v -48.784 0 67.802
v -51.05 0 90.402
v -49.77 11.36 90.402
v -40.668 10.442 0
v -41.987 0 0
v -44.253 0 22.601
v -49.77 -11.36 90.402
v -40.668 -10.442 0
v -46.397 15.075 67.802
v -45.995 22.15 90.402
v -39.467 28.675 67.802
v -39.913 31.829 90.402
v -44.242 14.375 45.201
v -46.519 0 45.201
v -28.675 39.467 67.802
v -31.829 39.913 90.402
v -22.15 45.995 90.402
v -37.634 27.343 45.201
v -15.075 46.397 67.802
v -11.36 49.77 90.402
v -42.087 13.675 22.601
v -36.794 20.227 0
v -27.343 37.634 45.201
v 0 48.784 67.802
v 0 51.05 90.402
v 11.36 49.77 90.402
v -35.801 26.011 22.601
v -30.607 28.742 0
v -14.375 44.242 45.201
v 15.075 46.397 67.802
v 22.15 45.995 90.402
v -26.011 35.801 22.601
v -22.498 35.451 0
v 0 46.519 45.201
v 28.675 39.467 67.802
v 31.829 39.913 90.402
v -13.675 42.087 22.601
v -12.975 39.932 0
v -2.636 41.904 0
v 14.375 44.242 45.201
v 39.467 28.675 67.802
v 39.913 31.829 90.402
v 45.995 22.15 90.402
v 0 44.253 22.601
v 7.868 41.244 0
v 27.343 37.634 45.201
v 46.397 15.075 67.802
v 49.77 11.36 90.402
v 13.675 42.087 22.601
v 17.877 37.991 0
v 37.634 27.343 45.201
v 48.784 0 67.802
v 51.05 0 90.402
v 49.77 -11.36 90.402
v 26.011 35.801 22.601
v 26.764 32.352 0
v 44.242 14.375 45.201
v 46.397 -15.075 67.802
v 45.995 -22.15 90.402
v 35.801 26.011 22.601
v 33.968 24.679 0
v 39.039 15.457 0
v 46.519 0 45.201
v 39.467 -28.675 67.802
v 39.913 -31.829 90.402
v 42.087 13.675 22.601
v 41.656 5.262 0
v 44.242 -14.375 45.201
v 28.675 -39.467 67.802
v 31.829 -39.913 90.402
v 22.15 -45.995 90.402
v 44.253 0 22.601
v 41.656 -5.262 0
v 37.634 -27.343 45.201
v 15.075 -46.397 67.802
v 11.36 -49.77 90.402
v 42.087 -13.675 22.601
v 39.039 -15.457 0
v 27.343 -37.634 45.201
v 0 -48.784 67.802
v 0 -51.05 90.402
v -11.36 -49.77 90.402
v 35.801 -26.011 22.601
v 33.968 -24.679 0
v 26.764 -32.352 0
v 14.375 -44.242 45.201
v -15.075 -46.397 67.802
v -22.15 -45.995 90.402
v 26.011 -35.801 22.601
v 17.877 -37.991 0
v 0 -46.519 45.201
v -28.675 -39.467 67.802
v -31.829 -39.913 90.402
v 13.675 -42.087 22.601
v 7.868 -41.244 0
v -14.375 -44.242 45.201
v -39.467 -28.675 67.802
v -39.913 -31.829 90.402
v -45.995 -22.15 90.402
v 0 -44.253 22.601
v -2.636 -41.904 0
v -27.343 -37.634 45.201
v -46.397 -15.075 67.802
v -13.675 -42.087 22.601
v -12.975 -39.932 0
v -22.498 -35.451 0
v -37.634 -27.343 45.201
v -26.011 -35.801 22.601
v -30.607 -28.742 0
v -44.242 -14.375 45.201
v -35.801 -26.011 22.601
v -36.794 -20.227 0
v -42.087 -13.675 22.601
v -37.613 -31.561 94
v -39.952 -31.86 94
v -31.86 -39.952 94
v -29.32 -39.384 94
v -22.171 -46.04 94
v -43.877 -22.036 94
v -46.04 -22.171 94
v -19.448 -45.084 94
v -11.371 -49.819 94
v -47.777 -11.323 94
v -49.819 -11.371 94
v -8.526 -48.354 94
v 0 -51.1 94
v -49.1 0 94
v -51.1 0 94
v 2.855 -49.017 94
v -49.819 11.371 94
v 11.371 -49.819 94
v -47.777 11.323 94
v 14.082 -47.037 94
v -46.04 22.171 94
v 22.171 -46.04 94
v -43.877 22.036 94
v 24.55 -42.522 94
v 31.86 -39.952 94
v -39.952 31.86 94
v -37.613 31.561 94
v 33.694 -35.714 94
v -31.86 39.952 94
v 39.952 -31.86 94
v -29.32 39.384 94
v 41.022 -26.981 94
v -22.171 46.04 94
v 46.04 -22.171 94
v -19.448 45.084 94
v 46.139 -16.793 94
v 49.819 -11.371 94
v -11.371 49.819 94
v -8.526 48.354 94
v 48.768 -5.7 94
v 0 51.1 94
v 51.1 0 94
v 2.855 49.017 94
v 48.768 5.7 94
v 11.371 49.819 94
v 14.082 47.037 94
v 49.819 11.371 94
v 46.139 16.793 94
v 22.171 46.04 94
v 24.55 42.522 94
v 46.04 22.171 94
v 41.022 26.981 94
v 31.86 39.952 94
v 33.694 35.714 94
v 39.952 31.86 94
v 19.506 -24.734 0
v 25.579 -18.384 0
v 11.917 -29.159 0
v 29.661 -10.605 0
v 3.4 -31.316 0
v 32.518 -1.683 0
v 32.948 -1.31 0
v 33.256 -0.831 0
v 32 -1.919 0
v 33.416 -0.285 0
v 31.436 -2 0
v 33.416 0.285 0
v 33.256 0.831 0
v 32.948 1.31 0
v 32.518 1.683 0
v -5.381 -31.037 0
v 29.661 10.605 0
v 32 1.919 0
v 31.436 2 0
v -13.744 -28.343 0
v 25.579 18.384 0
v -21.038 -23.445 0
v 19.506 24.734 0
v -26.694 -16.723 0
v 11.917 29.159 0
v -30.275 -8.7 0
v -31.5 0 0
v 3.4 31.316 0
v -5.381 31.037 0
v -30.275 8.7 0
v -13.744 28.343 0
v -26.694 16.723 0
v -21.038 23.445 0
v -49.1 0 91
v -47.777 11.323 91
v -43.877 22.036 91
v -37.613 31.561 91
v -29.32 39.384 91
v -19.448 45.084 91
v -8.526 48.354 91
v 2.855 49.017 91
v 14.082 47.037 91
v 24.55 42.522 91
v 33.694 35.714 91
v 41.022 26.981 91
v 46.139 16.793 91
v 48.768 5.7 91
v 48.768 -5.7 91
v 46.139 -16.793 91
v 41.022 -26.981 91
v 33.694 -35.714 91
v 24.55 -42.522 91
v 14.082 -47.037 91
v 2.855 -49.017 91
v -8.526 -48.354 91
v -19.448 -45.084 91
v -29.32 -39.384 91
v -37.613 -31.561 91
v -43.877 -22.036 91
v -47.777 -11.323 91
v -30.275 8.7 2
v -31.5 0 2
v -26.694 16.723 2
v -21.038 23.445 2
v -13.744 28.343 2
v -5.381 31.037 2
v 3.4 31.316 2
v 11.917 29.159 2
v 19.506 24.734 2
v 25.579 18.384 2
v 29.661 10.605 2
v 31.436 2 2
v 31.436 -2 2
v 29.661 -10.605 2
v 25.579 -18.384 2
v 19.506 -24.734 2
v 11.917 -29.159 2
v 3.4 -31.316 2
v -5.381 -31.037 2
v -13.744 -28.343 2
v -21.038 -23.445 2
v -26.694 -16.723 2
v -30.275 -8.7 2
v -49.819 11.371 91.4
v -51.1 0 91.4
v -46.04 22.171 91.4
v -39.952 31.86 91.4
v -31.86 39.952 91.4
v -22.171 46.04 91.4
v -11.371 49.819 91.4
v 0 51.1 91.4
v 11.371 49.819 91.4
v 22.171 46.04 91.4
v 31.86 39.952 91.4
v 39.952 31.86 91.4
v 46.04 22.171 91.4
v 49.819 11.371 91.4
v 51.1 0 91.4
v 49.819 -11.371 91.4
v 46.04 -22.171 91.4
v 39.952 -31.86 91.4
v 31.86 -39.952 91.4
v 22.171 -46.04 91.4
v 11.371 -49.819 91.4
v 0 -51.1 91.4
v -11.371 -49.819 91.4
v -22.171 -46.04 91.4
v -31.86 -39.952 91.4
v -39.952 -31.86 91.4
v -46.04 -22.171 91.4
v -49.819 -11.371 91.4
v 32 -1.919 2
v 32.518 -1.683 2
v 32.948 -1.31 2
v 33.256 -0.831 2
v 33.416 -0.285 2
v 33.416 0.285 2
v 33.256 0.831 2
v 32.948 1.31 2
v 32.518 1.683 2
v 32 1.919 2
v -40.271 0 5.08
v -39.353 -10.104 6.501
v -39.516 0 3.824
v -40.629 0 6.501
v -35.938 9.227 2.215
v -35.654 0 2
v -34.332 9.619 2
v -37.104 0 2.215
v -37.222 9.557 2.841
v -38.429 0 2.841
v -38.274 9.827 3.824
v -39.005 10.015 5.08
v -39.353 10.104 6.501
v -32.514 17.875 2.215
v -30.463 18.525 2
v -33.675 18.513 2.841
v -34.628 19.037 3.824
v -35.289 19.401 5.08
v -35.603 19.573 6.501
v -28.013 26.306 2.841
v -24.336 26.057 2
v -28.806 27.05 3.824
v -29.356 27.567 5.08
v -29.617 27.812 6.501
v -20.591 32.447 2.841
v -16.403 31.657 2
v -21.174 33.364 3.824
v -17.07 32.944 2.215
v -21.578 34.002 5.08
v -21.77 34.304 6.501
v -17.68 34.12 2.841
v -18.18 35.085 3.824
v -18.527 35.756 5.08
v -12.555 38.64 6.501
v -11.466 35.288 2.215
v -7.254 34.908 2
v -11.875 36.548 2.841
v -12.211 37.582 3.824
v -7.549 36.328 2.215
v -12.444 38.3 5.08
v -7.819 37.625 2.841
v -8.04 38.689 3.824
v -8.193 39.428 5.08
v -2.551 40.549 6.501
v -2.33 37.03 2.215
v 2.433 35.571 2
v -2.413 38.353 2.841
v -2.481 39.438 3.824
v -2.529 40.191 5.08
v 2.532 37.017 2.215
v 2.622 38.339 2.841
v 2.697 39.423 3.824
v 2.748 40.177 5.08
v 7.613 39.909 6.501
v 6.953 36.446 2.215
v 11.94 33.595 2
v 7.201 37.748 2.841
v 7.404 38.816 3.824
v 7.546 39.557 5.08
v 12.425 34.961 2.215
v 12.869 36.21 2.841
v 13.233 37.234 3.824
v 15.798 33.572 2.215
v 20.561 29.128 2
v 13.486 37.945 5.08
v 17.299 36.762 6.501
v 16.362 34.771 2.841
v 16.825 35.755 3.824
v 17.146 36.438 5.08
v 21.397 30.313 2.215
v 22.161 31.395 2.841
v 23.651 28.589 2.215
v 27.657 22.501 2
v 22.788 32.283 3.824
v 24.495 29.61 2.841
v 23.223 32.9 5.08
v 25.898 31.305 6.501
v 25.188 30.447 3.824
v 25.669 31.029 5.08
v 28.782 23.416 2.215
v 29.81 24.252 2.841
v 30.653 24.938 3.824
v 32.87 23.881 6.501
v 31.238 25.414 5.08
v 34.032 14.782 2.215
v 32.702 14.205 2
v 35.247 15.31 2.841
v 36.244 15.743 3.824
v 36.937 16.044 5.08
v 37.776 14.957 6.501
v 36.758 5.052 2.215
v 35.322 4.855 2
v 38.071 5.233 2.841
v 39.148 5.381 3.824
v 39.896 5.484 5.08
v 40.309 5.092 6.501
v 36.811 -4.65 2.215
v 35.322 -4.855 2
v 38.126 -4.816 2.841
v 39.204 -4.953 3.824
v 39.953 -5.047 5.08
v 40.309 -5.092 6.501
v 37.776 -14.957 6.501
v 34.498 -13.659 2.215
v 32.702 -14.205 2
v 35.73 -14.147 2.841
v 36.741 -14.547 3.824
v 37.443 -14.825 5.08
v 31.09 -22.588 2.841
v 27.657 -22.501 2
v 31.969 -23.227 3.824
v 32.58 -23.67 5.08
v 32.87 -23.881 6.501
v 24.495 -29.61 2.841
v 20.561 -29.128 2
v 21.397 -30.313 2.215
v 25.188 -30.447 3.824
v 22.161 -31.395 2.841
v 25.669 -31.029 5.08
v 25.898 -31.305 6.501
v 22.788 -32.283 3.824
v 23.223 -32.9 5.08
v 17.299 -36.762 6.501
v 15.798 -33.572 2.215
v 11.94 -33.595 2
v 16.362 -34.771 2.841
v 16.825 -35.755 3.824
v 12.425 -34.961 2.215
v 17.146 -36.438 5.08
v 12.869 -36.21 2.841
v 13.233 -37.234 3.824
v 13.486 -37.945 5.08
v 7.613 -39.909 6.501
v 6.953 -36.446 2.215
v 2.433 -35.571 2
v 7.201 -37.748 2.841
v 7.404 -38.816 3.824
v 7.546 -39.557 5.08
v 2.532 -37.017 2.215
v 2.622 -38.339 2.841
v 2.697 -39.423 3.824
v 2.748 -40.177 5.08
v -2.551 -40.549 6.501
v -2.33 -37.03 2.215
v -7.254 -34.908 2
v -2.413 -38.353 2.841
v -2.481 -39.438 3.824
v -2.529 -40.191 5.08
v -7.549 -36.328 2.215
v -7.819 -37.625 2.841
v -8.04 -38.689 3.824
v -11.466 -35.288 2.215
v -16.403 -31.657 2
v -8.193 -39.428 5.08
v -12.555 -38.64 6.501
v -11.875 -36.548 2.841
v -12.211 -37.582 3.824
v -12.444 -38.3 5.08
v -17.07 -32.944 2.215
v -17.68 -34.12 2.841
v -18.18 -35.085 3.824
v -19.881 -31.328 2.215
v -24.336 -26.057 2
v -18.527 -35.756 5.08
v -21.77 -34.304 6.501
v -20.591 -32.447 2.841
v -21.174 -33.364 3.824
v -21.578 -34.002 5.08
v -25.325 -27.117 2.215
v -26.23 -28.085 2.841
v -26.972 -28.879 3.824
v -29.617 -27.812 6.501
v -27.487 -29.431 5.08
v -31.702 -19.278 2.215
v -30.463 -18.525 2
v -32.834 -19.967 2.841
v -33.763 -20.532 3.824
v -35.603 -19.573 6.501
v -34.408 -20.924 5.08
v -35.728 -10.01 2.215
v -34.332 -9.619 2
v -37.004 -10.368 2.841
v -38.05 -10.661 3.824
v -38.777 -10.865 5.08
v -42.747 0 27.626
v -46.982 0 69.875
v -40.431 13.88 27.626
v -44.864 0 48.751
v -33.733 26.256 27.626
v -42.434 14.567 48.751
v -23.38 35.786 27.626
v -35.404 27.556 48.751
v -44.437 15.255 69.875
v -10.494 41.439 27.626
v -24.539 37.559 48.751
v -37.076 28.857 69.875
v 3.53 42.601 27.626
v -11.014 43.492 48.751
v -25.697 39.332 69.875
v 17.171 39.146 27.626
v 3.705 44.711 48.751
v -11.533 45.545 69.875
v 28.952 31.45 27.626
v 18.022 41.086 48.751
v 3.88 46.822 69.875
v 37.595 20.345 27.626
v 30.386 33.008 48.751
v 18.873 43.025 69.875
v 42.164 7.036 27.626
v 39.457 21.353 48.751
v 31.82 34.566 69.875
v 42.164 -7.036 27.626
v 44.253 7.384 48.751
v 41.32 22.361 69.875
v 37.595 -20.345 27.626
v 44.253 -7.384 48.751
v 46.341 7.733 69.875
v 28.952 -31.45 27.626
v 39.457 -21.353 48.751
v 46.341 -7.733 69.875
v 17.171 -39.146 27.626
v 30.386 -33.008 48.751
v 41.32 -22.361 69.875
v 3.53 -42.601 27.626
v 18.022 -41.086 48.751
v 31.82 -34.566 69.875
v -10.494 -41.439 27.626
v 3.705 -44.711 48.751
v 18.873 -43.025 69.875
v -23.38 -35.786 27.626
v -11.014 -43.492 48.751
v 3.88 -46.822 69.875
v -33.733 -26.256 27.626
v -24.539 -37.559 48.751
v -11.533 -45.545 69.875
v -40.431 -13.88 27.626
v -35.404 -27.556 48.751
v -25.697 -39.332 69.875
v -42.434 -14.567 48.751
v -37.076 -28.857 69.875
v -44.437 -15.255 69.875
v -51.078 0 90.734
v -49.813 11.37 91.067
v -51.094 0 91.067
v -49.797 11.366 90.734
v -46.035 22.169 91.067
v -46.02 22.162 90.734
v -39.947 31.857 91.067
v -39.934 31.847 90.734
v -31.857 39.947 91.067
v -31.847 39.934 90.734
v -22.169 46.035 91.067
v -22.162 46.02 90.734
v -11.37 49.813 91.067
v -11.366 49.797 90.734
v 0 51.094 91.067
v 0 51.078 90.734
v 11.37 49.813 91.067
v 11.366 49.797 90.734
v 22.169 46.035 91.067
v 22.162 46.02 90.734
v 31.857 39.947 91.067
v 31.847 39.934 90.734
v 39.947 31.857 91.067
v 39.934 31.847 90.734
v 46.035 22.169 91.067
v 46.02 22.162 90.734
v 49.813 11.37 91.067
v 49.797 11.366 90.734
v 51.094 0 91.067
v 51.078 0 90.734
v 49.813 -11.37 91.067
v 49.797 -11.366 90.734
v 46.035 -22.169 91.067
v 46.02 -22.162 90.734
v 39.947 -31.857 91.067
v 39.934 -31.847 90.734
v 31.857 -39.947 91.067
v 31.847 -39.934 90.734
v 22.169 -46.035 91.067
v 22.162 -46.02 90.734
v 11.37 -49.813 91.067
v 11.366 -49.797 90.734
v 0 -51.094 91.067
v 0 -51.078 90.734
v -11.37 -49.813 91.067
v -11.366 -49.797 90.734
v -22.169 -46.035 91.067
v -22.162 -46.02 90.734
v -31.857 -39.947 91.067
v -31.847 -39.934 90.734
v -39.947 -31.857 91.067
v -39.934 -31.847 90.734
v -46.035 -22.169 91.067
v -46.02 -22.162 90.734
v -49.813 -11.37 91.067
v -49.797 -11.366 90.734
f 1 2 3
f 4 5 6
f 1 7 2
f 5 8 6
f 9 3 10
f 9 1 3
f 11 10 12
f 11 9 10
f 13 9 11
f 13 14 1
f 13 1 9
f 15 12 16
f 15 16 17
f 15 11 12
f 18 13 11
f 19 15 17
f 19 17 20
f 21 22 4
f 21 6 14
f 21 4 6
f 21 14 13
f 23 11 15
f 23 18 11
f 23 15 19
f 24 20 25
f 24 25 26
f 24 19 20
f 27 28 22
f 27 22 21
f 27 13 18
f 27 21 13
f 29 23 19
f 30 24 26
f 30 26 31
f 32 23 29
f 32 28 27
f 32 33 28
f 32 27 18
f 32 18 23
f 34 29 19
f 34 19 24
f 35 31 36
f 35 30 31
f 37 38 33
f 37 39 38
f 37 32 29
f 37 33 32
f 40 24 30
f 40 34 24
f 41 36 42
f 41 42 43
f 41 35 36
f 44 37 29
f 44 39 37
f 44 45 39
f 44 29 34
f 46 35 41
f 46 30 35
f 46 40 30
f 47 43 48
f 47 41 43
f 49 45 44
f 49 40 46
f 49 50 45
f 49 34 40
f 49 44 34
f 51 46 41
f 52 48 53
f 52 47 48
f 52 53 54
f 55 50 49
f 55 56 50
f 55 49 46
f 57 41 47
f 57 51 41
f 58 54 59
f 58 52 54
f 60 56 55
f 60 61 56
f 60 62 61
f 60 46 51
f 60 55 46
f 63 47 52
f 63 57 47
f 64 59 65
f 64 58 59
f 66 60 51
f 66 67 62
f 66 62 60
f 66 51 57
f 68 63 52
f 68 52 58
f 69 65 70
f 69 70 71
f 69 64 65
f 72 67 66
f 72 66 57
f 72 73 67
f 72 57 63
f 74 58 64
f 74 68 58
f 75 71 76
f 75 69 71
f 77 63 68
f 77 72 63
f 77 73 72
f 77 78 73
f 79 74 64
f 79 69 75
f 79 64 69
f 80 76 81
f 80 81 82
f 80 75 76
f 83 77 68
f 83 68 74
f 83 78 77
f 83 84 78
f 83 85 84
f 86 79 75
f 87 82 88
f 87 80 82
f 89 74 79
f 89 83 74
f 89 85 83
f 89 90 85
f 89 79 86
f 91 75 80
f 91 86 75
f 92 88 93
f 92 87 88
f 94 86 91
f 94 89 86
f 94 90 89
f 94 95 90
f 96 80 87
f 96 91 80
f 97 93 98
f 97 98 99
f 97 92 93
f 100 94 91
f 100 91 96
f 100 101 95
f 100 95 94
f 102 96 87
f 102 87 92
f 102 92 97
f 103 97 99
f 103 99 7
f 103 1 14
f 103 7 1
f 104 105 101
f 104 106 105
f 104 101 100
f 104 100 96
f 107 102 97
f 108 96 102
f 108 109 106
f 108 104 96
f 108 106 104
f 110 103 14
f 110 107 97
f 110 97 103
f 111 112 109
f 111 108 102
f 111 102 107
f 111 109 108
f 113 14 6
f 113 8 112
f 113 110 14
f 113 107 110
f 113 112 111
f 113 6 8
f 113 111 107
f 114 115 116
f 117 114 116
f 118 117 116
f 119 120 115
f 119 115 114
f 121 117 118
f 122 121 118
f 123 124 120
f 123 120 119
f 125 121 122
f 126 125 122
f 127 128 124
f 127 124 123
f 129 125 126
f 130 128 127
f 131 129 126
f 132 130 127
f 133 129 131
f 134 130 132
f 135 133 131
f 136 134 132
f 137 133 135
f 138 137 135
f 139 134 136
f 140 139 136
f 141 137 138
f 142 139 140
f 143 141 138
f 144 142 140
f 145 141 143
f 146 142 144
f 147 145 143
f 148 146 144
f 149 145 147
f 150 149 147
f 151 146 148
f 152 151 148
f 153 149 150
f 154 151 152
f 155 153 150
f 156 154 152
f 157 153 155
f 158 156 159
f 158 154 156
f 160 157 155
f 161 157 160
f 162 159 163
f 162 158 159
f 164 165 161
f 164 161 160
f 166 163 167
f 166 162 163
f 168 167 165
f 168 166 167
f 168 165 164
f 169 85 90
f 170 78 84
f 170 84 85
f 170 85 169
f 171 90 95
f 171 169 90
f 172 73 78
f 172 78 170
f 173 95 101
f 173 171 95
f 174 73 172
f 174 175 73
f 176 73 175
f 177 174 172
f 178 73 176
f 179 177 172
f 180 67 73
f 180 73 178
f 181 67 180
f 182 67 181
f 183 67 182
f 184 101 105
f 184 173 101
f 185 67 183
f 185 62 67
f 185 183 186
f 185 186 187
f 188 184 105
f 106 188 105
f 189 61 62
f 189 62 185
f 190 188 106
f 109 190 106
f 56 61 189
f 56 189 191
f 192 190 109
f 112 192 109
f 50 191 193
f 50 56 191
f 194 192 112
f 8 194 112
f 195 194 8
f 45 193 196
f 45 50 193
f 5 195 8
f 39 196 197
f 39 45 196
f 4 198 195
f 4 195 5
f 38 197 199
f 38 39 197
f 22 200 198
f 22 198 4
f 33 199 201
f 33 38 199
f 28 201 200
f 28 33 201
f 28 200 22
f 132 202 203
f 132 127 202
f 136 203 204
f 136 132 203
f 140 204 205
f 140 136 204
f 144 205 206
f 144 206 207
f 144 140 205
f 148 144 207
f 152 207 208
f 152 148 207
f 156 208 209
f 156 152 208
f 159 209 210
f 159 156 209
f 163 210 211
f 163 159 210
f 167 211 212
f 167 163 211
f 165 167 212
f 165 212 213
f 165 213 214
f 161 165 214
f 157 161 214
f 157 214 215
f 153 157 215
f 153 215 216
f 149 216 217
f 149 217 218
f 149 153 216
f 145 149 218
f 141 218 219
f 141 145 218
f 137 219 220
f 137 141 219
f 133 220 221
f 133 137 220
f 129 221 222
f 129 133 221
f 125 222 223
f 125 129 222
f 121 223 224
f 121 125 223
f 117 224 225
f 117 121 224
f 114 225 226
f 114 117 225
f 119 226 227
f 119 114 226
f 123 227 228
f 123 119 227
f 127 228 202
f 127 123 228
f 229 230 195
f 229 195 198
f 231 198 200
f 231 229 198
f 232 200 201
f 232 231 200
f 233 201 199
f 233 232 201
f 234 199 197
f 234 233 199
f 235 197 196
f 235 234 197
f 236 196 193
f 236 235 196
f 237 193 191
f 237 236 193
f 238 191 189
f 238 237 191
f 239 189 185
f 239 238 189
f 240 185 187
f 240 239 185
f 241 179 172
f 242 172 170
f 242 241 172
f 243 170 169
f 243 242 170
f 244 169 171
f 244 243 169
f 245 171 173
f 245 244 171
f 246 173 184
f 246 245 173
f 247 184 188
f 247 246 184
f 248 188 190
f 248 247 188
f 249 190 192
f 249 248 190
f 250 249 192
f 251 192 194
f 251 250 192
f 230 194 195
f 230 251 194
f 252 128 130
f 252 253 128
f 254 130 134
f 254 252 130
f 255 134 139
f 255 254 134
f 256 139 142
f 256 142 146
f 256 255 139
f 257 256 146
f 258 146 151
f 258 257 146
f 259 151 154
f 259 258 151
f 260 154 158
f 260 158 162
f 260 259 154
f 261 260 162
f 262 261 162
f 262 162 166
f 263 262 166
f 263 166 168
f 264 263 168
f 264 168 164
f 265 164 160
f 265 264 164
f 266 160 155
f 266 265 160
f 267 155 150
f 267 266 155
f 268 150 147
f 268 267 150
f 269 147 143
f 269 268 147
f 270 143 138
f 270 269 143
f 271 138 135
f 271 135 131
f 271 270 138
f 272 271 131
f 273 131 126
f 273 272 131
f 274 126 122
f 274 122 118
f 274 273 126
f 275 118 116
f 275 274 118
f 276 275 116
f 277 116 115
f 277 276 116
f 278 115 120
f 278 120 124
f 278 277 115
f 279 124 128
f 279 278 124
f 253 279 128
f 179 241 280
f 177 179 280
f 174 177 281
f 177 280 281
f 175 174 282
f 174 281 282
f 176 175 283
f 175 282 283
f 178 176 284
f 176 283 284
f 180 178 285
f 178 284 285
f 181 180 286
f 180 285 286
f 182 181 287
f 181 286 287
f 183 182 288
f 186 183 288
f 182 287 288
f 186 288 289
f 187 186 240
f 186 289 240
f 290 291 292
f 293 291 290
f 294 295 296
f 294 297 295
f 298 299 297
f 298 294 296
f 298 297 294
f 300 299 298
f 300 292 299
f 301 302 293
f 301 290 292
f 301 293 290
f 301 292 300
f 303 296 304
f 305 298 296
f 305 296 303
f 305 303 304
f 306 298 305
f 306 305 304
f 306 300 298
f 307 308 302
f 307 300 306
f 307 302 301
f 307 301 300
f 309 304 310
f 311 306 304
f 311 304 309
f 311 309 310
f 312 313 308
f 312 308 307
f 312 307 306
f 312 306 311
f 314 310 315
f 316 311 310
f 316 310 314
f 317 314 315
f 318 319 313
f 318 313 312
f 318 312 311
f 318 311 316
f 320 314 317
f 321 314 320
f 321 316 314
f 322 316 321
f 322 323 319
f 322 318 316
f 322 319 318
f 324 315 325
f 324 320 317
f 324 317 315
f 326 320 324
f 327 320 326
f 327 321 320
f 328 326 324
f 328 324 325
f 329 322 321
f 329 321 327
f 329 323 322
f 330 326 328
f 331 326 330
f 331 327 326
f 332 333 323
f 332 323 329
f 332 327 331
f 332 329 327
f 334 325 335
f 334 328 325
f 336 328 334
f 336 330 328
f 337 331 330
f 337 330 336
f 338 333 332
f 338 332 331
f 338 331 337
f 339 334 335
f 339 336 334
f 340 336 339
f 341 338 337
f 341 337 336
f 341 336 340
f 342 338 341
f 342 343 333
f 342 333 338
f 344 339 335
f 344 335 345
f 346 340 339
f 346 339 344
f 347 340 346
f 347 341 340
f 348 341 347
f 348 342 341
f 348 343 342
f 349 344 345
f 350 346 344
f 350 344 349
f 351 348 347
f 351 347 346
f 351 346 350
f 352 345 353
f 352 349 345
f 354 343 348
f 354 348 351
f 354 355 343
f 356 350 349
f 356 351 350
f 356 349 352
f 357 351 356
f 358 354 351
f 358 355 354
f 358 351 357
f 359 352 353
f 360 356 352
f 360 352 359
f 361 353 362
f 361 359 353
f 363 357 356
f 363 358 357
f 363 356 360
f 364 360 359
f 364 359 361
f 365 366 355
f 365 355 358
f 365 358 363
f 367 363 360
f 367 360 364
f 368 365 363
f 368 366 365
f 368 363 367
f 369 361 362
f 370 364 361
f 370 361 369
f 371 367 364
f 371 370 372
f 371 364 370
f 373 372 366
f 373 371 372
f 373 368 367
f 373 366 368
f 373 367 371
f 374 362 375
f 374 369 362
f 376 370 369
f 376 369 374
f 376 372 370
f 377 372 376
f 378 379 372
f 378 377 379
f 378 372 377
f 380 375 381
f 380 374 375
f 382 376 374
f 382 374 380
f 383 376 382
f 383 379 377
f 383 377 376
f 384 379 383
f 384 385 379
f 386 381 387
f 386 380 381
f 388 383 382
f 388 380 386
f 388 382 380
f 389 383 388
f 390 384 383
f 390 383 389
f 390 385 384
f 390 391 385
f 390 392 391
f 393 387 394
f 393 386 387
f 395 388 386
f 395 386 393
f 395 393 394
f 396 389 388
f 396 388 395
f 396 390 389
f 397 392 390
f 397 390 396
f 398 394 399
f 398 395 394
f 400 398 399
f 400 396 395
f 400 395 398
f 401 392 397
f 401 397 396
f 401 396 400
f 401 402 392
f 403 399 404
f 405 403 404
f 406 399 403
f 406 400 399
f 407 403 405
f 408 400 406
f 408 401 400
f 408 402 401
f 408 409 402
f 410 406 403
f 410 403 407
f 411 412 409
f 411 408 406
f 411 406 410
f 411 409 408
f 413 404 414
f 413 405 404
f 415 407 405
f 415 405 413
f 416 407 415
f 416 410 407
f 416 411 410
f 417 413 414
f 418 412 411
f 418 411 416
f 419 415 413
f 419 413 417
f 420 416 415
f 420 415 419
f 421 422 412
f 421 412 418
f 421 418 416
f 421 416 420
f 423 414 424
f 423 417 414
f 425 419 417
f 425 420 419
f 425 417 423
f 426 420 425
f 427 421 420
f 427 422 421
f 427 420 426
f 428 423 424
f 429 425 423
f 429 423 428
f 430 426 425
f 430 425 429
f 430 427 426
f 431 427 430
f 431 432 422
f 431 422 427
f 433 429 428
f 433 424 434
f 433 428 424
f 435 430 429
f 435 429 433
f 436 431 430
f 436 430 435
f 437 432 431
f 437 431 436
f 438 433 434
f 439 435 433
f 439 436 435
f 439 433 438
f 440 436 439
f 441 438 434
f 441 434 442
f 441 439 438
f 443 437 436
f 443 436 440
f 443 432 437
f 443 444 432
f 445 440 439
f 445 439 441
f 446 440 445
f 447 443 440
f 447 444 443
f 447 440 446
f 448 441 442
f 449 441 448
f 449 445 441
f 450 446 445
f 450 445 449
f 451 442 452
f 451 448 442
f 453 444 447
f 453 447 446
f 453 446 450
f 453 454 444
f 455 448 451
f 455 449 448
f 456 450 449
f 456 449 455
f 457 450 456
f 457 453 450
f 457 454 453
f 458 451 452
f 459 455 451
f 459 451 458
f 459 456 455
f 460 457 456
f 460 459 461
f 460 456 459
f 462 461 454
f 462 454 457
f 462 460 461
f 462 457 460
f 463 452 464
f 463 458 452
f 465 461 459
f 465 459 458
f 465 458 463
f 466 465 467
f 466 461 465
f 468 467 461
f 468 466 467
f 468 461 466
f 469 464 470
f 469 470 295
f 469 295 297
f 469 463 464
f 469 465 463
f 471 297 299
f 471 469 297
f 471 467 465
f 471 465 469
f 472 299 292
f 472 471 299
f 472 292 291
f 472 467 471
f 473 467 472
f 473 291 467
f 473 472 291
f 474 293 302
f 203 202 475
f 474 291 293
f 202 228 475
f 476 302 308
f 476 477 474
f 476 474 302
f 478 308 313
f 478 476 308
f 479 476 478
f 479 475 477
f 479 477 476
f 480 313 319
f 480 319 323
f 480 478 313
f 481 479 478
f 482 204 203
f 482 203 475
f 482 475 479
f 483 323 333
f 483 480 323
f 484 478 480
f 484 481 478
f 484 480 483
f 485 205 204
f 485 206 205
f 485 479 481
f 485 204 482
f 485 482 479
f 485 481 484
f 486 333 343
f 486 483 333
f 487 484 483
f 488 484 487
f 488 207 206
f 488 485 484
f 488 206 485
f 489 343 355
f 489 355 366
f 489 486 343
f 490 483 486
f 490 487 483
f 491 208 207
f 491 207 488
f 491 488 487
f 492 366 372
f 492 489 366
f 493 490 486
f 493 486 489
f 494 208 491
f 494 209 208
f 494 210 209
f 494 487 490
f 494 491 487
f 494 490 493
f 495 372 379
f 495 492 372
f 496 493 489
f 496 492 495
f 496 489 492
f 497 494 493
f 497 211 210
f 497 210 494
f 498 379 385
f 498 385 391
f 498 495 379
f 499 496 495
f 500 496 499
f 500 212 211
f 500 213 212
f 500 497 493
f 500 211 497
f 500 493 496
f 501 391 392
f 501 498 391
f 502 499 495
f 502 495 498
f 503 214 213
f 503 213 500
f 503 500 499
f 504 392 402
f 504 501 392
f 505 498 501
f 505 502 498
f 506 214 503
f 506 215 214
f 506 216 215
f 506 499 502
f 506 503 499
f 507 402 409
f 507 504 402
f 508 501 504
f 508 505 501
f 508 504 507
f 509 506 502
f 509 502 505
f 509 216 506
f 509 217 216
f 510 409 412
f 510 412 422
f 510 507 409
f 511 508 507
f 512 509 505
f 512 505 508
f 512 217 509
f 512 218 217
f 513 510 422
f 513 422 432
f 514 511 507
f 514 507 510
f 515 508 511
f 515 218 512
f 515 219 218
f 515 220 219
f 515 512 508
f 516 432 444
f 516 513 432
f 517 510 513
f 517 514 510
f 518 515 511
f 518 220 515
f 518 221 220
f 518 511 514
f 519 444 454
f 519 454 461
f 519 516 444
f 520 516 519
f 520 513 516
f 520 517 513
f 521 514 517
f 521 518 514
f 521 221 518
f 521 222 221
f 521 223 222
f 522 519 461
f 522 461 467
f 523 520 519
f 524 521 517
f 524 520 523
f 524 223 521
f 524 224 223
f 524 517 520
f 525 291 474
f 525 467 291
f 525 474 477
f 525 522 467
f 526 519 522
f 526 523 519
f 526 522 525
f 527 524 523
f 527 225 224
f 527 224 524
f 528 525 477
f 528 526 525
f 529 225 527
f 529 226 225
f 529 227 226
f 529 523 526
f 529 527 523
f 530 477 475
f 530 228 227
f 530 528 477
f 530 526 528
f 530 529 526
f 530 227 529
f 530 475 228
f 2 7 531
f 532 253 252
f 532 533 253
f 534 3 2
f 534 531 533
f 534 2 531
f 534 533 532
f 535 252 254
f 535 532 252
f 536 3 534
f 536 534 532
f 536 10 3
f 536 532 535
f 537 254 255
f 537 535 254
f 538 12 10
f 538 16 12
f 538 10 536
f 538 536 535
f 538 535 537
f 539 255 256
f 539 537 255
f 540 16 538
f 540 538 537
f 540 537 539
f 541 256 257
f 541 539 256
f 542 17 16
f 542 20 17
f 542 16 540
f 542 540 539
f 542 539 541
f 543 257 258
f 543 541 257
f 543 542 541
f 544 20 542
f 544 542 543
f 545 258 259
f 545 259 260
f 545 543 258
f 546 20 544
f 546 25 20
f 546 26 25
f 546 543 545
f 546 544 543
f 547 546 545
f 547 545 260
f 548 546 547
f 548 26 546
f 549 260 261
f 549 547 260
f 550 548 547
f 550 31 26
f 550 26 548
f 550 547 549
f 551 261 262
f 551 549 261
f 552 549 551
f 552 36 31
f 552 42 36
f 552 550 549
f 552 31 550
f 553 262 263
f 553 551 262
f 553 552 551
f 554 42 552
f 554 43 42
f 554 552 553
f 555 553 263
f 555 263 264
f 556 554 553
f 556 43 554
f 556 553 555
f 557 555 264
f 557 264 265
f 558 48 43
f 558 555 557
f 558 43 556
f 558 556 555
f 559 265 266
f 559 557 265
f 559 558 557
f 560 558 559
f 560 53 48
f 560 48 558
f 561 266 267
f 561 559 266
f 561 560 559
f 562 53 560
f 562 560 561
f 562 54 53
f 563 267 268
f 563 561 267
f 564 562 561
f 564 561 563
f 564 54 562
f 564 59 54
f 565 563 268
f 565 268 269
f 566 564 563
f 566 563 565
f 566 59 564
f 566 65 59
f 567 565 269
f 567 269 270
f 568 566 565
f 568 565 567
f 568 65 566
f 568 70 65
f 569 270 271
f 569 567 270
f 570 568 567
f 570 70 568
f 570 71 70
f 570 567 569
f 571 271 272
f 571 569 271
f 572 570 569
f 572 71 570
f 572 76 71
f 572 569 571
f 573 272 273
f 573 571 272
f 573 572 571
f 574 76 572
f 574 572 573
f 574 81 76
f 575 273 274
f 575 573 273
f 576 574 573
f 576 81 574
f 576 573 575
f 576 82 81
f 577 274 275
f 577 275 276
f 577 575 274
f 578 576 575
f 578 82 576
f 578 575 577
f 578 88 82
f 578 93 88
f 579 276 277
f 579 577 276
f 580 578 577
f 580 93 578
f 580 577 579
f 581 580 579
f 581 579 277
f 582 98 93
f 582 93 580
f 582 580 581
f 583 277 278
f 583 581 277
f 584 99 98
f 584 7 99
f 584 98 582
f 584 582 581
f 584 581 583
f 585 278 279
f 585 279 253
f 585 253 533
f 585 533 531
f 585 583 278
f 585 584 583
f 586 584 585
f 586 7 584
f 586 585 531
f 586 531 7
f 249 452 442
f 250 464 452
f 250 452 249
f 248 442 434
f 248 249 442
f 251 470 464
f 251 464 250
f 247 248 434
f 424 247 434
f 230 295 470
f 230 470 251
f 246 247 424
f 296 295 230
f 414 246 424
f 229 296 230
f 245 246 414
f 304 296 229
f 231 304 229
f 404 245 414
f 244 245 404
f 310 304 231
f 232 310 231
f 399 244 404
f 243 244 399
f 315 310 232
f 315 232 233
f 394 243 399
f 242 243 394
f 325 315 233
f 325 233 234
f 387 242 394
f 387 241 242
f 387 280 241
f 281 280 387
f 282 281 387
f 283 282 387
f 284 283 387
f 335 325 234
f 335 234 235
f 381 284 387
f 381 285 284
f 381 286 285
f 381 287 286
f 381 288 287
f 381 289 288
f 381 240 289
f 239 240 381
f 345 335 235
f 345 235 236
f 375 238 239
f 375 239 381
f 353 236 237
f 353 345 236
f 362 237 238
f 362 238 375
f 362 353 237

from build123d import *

# Parameters (mm, degrees)
F3_DEPTH = 2.001


with BuildPart() as f1:
    # F0 (on Front) → F1 (revolve)
    with BuildSketch(Plane.XZ):
        with BuildLine():
            Line((-41.9872180451, 0), (-31.5, 0))
            Line((-31.5, 0), (-31.5, 2))
            Line((-31.5, 2), (-35.6538847118, 2))
            ThreePointArc((-35.6538847118, 2), (-39.0084513316, 3.2923211044), (-40.6289470559, 6.5012468828))
            Line((-40.6289470559, 6.5012468828), (-49.1, 91))
            Line((-49.1, 91), (-49.1, 94))
            Line((-49.1, 94), (-51.1, 94))
            Line((-51.1, 94), (-51.1, 91.4))
            ThreePointArc((-51.1, 91.4), (-51.0875233888, 90.9006238306), (-51.0501246883, 90.4024937656))
            Line((-51.0501246883, 90.4024937656), (-41.9872180451, 0))
        make_face()
    revolve(axis=Axis((0, 0, -11.3997804001), (0, 0, -1)))

    # F2 (on face) → F3 (cut, through all)
    with BuildSketch(Plane.XY.offset(2)):
        with BuildLine():
            ThreePointArc((31.5, 0), (31.4841069455, -1.0005047961), (31.4364438192, -2))
            ThreePointArc((31.4364438192, -2), (33.4364438192, 0), (31.4364438192, 2))
            ThreePointArc((31.4364438192, 2), (31.4841069455, 1.0005047961), (31.5, 0))
        make_face()
    extrude(amount=-F3_DEPTH, mode=Mode.SUBTRACT)


solid = f1.part
